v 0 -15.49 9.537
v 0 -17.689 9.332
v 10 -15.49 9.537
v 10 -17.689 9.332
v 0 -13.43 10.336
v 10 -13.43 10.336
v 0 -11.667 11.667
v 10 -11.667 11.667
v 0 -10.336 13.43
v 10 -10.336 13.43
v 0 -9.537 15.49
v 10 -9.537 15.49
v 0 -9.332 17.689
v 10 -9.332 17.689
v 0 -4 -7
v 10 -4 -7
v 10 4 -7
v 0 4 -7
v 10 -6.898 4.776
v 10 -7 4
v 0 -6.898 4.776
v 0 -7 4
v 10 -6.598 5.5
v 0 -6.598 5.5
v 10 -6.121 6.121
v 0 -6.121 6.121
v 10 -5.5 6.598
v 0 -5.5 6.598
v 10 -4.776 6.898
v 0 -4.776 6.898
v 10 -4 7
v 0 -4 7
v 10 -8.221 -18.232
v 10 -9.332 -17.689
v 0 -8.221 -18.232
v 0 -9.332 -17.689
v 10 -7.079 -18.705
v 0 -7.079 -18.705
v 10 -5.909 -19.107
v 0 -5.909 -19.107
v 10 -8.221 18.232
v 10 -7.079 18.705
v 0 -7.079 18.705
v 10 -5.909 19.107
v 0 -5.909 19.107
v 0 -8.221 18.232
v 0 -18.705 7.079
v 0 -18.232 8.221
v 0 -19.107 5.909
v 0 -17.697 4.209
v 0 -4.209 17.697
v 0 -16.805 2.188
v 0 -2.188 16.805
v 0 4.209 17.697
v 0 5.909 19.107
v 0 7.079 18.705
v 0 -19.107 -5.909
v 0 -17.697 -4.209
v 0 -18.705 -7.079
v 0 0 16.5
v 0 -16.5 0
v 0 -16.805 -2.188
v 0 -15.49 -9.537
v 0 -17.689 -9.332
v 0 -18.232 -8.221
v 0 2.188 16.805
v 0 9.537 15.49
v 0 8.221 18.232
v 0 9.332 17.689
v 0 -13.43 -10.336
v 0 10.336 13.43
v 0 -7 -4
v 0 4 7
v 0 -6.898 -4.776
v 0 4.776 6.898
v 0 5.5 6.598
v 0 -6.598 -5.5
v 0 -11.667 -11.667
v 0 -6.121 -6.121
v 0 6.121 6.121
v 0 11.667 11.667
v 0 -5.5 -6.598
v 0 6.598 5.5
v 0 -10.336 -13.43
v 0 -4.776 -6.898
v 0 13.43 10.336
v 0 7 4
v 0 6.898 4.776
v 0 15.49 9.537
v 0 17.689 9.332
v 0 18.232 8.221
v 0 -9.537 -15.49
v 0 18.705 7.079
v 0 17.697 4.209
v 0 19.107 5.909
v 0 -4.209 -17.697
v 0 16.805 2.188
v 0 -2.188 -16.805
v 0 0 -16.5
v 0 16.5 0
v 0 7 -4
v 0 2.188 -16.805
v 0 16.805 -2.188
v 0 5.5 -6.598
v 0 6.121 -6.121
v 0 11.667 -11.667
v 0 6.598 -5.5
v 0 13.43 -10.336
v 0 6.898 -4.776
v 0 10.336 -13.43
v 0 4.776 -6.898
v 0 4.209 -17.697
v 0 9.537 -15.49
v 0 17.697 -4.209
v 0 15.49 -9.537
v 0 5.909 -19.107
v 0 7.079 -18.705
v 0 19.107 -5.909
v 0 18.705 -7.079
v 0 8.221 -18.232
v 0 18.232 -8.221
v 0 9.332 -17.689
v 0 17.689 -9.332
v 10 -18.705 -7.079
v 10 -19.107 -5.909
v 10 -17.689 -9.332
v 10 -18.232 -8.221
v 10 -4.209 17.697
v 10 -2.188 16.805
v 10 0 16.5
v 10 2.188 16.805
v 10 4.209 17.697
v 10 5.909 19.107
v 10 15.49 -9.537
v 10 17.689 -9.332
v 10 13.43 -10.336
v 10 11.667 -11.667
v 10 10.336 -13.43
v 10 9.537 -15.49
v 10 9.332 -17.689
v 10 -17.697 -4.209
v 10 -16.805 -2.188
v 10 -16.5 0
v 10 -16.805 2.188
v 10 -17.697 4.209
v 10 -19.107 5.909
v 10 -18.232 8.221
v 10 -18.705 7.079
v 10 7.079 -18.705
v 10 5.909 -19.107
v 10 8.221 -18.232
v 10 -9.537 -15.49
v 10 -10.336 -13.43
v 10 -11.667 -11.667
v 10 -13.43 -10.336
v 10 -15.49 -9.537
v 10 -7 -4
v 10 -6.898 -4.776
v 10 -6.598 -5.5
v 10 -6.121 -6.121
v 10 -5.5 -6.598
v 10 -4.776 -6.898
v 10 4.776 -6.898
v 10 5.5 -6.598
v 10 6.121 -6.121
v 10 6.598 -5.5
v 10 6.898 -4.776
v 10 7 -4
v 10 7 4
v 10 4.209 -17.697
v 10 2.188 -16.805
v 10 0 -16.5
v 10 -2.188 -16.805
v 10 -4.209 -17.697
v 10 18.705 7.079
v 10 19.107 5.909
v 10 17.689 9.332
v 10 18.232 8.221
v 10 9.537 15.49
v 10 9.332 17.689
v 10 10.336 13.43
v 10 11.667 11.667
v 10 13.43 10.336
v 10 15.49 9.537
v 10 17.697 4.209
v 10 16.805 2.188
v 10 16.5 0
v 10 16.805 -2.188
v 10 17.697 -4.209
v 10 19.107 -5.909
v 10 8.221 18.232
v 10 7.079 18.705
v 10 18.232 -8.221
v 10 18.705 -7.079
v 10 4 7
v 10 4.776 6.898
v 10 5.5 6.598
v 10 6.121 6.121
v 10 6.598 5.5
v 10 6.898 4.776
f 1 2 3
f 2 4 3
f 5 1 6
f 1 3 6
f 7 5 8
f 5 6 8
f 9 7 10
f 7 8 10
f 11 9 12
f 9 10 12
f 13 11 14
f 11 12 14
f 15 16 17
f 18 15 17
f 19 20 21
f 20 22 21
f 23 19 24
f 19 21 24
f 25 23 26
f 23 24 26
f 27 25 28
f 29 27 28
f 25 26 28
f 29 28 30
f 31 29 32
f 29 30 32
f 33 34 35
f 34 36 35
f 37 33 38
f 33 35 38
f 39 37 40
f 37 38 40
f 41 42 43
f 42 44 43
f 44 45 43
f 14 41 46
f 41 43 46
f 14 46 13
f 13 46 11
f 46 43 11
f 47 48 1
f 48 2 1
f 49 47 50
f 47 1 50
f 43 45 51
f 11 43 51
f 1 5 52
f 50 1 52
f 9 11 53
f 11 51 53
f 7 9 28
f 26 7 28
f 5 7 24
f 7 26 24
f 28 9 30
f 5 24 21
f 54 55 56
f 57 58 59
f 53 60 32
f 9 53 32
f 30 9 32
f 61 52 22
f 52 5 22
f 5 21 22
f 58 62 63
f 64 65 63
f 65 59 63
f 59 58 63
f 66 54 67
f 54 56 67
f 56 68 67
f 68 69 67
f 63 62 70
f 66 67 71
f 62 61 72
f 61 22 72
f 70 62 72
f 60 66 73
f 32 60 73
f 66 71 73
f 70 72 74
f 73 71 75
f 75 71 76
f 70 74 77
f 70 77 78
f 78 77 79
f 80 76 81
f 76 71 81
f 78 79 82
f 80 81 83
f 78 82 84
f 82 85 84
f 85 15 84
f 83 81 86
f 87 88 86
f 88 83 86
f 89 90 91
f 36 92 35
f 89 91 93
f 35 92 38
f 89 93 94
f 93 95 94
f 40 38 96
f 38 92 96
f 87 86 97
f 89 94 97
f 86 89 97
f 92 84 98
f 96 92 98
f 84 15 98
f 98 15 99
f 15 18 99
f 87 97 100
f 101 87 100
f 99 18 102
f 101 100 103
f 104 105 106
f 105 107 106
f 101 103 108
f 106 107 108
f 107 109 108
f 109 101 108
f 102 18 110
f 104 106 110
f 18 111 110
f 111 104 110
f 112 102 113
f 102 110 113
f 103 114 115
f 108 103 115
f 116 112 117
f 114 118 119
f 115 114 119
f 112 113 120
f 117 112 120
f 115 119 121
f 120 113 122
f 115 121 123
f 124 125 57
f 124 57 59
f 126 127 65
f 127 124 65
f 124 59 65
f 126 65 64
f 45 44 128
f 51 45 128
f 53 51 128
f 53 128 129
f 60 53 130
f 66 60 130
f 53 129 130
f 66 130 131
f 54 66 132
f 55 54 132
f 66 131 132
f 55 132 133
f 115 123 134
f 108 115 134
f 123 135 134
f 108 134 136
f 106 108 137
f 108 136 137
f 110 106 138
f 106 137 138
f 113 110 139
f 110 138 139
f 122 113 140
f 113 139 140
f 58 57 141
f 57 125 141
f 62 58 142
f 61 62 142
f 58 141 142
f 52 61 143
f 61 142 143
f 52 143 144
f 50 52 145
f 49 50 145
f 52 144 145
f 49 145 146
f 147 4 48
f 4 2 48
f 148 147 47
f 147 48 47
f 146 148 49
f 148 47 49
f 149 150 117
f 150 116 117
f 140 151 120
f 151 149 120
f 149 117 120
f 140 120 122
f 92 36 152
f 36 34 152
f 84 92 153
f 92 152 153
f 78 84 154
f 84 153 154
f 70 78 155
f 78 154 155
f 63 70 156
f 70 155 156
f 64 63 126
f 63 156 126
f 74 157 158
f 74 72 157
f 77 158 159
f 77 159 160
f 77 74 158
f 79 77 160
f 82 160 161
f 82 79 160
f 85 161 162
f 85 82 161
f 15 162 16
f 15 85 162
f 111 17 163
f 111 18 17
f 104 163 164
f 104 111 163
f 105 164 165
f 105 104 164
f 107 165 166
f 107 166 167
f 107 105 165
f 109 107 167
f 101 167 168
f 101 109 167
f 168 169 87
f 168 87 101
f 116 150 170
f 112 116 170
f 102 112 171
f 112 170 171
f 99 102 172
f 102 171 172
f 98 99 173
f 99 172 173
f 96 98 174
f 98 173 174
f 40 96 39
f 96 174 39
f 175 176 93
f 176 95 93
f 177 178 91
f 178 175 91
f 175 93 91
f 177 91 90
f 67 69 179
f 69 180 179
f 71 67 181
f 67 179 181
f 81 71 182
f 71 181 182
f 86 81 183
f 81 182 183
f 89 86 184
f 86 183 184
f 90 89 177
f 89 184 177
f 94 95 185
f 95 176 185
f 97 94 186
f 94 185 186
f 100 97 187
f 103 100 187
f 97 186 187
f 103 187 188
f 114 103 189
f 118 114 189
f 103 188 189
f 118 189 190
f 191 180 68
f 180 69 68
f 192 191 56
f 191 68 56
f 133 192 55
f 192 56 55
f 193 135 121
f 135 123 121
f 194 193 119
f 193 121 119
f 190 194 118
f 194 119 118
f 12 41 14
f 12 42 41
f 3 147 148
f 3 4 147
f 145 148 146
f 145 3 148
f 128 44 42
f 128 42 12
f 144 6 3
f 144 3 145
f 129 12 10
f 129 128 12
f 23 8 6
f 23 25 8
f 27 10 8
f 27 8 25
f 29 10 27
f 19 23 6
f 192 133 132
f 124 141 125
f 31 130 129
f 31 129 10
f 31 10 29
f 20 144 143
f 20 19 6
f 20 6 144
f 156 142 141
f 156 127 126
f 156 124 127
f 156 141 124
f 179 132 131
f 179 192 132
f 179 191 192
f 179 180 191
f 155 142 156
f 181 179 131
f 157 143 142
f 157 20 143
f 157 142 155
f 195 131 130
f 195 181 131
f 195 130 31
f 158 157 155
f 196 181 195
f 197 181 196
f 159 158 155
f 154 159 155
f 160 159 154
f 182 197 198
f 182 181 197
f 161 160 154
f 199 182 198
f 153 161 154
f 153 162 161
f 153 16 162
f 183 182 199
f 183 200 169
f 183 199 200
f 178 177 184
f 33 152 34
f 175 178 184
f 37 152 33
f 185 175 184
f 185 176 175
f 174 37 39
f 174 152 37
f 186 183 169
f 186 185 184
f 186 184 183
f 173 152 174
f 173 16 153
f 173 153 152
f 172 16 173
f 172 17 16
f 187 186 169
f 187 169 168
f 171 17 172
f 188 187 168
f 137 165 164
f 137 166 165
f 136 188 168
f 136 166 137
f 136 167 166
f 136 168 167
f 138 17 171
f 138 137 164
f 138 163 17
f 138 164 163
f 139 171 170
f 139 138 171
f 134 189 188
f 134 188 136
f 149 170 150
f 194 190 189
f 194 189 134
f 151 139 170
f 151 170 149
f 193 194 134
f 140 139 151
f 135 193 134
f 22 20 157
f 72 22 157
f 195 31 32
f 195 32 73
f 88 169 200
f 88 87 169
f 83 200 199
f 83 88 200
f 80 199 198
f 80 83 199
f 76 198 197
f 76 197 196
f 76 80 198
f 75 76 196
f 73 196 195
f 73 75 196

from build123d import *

# Parameters (mm, degrees)
SKETCH1_R           = 20
BOSS_EXTRUDE1_DEPTH = 10
SKETCH2_W           = 14
SKETCH2_H           = 14
CUT_EXTRUDE1_DEPTH  = 10
FILLET1_R           = 3
SKETCH3_R           = 8
CUT_EXTRUDE2_DEPTH  = 10
SKETCH3_3_R         = 8
CUT_EXTRUDE3_DEPTH  = 10
CIRPATTERN2_COUNT   = 8


with BuildPart() as part:
    # Sketch1 → Boss-Extrude1 (new body)
    with BuildSketch(Plane(origin=(0, 0, 0), x_dir=(0, 0, -1), z_dir=(1, 0, 0))):
        Circle(SKETCH1_R)
    extrude(amount=BOSS_EXTRUDE1_DEPTH)

    # Sketch2 → Cut-Extrude1 (cut)
    with BuildSketch(Plane(origin=(10, 0, 0), x_dir=(0, 0, -1), z_dir=(1, 0, 0))):
        Rectangle(SKETCH2_W, SKETCH2_H)
    extrude(amount=-CUT_EXTRUDE1_DEPTH, mode=Mode.SUBTRACT)

    # Fillet1
    fillet1_edges = [part.edges().sort_by_distance(p)[0] for p in [
        (5, -7, 7),
        (5, -7, -7),
        (5, 7, 7),
        (5, 7, -7),
    ]]
    fillet(fillet1_edges, radius=FILLET1_R)

    # Sketch3 → Cut-Extrude2 (cut)
    with BuildSketch(Plane(origin=(10, 0, 0), x_dir=(0, 0, -1), z_dir=(1, 0, 0))):
        with Locations((-24.5, 0)):
            Circle(SKETCH3_R)
    cut_extrude2 = extrude(amount=-CUT_EXTRUDE2_DEPTH, mode=Mode.SUBTRACT)

    # Sketch3<3> → Cut-Extrude3 (cut)
    with BuildSketch(Plane(origin=(10, 0, 0), x_dir=(0, 0, -1), z_dir=(1, 0, 0))):
        with Locations((24.5, 0)):
            Circle(SKETCH3_3_R)
        with Locations((-24.5, 0)):
            Circle(SKETCH3_3_R)
    extrude(amount=-CUT_EXTRUDE3_DEPTH, mode=Mode.SUBTRACT)

    # CirPattern2: Cut-Extrude2 ×8 about axis
    cirpattern2_axis = Axis((10, 0, 0), (1, 0, 0))
    for i in range(1, CIRPATTERN2_COUNT):
        add(cut_extrude2.rotate(cirpattern2_axis, i * 360 / CIRPATTERN2_COUNT), mode=Mode.SUBTRACT)


solid = part.part
